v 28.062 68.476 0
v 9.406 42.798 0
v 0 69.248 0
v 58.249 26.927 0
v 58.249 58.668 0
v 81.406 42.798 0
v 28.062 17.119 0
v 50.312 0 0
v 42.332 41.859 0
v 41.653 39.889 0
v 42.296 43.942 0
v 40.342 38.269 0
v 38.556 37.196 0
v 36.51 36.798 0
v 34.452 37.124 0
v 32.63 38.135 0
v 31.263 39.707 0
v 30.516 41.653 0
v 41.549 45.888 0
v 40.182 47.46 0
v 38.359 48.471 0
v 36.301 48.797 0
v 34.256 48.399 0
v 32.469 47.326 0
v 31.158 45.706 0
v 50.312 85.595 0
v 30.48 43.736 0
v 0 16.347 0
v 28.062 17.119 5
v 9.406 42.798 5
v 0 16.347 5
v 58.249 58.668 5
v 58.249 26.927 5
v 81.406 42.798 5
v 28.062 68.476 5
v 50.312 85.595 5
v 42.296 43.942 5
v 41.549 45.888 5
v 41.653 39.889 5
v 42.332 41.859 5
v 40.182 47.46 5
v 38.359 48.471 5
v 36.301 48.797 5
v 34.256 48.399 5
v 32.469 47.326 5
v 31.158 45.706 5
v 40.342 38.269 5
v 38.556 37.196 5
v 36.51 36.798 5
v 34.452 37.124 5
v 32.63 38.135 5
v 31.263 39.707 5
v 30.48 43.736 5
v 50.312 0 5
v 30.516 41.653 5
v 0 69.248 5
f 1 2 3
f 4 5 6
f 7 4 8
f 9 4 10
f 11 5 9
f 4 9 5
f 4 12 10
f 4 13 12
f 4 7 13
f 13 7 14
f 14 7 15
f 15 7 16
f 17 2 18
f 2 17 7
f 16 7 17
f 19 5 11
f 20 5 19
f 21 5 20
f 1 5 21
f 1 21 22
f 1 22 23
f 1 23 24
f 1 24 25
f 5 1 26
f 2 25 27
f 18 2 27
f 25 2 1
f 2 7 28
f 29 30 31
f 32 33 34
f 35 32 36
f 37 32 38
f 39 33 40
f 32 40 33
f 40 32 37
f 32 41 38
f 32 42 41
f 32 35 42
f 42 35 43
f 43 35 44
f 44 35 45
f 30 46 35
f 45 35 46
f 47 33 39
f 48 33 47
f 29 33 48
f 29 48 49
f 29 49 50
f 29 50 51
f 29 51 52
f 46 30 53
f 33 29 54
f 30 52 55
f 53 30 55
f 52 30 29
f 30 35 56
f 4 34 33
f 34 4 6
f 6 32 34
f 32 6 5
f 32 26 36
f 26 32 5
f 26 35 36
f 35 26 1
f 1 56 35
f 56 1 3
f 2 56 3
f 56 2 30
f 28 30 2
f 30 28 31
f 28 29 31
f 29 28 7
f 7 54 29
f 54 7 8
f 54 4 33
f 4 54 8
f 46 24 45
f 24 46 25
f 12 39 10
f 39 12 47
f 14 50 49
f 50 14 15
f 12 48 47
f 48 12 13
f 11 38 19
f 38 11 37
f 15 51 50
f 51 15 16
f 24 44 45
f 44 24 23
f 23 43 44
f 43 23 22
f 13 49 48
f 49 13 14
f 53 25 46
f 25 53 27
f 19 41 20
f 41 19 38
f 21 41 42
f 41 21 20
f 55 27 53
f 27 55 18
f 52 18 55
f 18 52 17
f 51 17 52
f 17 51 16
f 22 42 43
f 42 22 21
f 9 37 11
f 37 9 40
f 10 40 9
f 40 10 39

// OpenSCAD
$fn = 32;

// ----------------------------------------------------------------------
// Star wheel: 5-point blunt, R45
// ----------------------------------------------------------------------

// --- parameters (mm) ---
n_points = 5;             // number of points / teeth
r_out = 45;               // tip radius
r_in = 27;                // root radius
bore_r = 6;               // centre bore radius
plate_t = 5;              // plate thickness, Z (extrusion height)
bore_d = 12;              // centre bore diameter

profile = [[81.406, 42.798], [58.249, 58.668], [50.312, 85.595], [28.062, 68.476], [0, 69.248], [9.406, 42.798], [0, 16.347], [28.062, 17.119], [50.312, 0], [58.249, 26.927]];  // primary outline, 10 points, counter clockwise
void_1 = [[42.296, 43.942], [41.549, 45.888], [40.182, 47.46], [38.359, 48.471], [36.301, 48.797], [34.256, 48.399], [32.469, 47.326], [31.158, 45.706], [30.48, 43.736], [30.516, 41.653], [31.263, 39.707], [32.63, 38.135], [34.452, 37.124], [36.51, 36.798], [38.556, 37.196], [40.342, 38.269], [41.653, 39.889], [42.332, 41.859]];  // centre bore, 18 points

// --- the one profile operation ---
difference() {
  linear_extrude(height = plate_t) polygon(points = profile);
  translate([0, 0, -1])
    linear_extrude(height = plate_t + 2) polygon(points = void_1);
}
